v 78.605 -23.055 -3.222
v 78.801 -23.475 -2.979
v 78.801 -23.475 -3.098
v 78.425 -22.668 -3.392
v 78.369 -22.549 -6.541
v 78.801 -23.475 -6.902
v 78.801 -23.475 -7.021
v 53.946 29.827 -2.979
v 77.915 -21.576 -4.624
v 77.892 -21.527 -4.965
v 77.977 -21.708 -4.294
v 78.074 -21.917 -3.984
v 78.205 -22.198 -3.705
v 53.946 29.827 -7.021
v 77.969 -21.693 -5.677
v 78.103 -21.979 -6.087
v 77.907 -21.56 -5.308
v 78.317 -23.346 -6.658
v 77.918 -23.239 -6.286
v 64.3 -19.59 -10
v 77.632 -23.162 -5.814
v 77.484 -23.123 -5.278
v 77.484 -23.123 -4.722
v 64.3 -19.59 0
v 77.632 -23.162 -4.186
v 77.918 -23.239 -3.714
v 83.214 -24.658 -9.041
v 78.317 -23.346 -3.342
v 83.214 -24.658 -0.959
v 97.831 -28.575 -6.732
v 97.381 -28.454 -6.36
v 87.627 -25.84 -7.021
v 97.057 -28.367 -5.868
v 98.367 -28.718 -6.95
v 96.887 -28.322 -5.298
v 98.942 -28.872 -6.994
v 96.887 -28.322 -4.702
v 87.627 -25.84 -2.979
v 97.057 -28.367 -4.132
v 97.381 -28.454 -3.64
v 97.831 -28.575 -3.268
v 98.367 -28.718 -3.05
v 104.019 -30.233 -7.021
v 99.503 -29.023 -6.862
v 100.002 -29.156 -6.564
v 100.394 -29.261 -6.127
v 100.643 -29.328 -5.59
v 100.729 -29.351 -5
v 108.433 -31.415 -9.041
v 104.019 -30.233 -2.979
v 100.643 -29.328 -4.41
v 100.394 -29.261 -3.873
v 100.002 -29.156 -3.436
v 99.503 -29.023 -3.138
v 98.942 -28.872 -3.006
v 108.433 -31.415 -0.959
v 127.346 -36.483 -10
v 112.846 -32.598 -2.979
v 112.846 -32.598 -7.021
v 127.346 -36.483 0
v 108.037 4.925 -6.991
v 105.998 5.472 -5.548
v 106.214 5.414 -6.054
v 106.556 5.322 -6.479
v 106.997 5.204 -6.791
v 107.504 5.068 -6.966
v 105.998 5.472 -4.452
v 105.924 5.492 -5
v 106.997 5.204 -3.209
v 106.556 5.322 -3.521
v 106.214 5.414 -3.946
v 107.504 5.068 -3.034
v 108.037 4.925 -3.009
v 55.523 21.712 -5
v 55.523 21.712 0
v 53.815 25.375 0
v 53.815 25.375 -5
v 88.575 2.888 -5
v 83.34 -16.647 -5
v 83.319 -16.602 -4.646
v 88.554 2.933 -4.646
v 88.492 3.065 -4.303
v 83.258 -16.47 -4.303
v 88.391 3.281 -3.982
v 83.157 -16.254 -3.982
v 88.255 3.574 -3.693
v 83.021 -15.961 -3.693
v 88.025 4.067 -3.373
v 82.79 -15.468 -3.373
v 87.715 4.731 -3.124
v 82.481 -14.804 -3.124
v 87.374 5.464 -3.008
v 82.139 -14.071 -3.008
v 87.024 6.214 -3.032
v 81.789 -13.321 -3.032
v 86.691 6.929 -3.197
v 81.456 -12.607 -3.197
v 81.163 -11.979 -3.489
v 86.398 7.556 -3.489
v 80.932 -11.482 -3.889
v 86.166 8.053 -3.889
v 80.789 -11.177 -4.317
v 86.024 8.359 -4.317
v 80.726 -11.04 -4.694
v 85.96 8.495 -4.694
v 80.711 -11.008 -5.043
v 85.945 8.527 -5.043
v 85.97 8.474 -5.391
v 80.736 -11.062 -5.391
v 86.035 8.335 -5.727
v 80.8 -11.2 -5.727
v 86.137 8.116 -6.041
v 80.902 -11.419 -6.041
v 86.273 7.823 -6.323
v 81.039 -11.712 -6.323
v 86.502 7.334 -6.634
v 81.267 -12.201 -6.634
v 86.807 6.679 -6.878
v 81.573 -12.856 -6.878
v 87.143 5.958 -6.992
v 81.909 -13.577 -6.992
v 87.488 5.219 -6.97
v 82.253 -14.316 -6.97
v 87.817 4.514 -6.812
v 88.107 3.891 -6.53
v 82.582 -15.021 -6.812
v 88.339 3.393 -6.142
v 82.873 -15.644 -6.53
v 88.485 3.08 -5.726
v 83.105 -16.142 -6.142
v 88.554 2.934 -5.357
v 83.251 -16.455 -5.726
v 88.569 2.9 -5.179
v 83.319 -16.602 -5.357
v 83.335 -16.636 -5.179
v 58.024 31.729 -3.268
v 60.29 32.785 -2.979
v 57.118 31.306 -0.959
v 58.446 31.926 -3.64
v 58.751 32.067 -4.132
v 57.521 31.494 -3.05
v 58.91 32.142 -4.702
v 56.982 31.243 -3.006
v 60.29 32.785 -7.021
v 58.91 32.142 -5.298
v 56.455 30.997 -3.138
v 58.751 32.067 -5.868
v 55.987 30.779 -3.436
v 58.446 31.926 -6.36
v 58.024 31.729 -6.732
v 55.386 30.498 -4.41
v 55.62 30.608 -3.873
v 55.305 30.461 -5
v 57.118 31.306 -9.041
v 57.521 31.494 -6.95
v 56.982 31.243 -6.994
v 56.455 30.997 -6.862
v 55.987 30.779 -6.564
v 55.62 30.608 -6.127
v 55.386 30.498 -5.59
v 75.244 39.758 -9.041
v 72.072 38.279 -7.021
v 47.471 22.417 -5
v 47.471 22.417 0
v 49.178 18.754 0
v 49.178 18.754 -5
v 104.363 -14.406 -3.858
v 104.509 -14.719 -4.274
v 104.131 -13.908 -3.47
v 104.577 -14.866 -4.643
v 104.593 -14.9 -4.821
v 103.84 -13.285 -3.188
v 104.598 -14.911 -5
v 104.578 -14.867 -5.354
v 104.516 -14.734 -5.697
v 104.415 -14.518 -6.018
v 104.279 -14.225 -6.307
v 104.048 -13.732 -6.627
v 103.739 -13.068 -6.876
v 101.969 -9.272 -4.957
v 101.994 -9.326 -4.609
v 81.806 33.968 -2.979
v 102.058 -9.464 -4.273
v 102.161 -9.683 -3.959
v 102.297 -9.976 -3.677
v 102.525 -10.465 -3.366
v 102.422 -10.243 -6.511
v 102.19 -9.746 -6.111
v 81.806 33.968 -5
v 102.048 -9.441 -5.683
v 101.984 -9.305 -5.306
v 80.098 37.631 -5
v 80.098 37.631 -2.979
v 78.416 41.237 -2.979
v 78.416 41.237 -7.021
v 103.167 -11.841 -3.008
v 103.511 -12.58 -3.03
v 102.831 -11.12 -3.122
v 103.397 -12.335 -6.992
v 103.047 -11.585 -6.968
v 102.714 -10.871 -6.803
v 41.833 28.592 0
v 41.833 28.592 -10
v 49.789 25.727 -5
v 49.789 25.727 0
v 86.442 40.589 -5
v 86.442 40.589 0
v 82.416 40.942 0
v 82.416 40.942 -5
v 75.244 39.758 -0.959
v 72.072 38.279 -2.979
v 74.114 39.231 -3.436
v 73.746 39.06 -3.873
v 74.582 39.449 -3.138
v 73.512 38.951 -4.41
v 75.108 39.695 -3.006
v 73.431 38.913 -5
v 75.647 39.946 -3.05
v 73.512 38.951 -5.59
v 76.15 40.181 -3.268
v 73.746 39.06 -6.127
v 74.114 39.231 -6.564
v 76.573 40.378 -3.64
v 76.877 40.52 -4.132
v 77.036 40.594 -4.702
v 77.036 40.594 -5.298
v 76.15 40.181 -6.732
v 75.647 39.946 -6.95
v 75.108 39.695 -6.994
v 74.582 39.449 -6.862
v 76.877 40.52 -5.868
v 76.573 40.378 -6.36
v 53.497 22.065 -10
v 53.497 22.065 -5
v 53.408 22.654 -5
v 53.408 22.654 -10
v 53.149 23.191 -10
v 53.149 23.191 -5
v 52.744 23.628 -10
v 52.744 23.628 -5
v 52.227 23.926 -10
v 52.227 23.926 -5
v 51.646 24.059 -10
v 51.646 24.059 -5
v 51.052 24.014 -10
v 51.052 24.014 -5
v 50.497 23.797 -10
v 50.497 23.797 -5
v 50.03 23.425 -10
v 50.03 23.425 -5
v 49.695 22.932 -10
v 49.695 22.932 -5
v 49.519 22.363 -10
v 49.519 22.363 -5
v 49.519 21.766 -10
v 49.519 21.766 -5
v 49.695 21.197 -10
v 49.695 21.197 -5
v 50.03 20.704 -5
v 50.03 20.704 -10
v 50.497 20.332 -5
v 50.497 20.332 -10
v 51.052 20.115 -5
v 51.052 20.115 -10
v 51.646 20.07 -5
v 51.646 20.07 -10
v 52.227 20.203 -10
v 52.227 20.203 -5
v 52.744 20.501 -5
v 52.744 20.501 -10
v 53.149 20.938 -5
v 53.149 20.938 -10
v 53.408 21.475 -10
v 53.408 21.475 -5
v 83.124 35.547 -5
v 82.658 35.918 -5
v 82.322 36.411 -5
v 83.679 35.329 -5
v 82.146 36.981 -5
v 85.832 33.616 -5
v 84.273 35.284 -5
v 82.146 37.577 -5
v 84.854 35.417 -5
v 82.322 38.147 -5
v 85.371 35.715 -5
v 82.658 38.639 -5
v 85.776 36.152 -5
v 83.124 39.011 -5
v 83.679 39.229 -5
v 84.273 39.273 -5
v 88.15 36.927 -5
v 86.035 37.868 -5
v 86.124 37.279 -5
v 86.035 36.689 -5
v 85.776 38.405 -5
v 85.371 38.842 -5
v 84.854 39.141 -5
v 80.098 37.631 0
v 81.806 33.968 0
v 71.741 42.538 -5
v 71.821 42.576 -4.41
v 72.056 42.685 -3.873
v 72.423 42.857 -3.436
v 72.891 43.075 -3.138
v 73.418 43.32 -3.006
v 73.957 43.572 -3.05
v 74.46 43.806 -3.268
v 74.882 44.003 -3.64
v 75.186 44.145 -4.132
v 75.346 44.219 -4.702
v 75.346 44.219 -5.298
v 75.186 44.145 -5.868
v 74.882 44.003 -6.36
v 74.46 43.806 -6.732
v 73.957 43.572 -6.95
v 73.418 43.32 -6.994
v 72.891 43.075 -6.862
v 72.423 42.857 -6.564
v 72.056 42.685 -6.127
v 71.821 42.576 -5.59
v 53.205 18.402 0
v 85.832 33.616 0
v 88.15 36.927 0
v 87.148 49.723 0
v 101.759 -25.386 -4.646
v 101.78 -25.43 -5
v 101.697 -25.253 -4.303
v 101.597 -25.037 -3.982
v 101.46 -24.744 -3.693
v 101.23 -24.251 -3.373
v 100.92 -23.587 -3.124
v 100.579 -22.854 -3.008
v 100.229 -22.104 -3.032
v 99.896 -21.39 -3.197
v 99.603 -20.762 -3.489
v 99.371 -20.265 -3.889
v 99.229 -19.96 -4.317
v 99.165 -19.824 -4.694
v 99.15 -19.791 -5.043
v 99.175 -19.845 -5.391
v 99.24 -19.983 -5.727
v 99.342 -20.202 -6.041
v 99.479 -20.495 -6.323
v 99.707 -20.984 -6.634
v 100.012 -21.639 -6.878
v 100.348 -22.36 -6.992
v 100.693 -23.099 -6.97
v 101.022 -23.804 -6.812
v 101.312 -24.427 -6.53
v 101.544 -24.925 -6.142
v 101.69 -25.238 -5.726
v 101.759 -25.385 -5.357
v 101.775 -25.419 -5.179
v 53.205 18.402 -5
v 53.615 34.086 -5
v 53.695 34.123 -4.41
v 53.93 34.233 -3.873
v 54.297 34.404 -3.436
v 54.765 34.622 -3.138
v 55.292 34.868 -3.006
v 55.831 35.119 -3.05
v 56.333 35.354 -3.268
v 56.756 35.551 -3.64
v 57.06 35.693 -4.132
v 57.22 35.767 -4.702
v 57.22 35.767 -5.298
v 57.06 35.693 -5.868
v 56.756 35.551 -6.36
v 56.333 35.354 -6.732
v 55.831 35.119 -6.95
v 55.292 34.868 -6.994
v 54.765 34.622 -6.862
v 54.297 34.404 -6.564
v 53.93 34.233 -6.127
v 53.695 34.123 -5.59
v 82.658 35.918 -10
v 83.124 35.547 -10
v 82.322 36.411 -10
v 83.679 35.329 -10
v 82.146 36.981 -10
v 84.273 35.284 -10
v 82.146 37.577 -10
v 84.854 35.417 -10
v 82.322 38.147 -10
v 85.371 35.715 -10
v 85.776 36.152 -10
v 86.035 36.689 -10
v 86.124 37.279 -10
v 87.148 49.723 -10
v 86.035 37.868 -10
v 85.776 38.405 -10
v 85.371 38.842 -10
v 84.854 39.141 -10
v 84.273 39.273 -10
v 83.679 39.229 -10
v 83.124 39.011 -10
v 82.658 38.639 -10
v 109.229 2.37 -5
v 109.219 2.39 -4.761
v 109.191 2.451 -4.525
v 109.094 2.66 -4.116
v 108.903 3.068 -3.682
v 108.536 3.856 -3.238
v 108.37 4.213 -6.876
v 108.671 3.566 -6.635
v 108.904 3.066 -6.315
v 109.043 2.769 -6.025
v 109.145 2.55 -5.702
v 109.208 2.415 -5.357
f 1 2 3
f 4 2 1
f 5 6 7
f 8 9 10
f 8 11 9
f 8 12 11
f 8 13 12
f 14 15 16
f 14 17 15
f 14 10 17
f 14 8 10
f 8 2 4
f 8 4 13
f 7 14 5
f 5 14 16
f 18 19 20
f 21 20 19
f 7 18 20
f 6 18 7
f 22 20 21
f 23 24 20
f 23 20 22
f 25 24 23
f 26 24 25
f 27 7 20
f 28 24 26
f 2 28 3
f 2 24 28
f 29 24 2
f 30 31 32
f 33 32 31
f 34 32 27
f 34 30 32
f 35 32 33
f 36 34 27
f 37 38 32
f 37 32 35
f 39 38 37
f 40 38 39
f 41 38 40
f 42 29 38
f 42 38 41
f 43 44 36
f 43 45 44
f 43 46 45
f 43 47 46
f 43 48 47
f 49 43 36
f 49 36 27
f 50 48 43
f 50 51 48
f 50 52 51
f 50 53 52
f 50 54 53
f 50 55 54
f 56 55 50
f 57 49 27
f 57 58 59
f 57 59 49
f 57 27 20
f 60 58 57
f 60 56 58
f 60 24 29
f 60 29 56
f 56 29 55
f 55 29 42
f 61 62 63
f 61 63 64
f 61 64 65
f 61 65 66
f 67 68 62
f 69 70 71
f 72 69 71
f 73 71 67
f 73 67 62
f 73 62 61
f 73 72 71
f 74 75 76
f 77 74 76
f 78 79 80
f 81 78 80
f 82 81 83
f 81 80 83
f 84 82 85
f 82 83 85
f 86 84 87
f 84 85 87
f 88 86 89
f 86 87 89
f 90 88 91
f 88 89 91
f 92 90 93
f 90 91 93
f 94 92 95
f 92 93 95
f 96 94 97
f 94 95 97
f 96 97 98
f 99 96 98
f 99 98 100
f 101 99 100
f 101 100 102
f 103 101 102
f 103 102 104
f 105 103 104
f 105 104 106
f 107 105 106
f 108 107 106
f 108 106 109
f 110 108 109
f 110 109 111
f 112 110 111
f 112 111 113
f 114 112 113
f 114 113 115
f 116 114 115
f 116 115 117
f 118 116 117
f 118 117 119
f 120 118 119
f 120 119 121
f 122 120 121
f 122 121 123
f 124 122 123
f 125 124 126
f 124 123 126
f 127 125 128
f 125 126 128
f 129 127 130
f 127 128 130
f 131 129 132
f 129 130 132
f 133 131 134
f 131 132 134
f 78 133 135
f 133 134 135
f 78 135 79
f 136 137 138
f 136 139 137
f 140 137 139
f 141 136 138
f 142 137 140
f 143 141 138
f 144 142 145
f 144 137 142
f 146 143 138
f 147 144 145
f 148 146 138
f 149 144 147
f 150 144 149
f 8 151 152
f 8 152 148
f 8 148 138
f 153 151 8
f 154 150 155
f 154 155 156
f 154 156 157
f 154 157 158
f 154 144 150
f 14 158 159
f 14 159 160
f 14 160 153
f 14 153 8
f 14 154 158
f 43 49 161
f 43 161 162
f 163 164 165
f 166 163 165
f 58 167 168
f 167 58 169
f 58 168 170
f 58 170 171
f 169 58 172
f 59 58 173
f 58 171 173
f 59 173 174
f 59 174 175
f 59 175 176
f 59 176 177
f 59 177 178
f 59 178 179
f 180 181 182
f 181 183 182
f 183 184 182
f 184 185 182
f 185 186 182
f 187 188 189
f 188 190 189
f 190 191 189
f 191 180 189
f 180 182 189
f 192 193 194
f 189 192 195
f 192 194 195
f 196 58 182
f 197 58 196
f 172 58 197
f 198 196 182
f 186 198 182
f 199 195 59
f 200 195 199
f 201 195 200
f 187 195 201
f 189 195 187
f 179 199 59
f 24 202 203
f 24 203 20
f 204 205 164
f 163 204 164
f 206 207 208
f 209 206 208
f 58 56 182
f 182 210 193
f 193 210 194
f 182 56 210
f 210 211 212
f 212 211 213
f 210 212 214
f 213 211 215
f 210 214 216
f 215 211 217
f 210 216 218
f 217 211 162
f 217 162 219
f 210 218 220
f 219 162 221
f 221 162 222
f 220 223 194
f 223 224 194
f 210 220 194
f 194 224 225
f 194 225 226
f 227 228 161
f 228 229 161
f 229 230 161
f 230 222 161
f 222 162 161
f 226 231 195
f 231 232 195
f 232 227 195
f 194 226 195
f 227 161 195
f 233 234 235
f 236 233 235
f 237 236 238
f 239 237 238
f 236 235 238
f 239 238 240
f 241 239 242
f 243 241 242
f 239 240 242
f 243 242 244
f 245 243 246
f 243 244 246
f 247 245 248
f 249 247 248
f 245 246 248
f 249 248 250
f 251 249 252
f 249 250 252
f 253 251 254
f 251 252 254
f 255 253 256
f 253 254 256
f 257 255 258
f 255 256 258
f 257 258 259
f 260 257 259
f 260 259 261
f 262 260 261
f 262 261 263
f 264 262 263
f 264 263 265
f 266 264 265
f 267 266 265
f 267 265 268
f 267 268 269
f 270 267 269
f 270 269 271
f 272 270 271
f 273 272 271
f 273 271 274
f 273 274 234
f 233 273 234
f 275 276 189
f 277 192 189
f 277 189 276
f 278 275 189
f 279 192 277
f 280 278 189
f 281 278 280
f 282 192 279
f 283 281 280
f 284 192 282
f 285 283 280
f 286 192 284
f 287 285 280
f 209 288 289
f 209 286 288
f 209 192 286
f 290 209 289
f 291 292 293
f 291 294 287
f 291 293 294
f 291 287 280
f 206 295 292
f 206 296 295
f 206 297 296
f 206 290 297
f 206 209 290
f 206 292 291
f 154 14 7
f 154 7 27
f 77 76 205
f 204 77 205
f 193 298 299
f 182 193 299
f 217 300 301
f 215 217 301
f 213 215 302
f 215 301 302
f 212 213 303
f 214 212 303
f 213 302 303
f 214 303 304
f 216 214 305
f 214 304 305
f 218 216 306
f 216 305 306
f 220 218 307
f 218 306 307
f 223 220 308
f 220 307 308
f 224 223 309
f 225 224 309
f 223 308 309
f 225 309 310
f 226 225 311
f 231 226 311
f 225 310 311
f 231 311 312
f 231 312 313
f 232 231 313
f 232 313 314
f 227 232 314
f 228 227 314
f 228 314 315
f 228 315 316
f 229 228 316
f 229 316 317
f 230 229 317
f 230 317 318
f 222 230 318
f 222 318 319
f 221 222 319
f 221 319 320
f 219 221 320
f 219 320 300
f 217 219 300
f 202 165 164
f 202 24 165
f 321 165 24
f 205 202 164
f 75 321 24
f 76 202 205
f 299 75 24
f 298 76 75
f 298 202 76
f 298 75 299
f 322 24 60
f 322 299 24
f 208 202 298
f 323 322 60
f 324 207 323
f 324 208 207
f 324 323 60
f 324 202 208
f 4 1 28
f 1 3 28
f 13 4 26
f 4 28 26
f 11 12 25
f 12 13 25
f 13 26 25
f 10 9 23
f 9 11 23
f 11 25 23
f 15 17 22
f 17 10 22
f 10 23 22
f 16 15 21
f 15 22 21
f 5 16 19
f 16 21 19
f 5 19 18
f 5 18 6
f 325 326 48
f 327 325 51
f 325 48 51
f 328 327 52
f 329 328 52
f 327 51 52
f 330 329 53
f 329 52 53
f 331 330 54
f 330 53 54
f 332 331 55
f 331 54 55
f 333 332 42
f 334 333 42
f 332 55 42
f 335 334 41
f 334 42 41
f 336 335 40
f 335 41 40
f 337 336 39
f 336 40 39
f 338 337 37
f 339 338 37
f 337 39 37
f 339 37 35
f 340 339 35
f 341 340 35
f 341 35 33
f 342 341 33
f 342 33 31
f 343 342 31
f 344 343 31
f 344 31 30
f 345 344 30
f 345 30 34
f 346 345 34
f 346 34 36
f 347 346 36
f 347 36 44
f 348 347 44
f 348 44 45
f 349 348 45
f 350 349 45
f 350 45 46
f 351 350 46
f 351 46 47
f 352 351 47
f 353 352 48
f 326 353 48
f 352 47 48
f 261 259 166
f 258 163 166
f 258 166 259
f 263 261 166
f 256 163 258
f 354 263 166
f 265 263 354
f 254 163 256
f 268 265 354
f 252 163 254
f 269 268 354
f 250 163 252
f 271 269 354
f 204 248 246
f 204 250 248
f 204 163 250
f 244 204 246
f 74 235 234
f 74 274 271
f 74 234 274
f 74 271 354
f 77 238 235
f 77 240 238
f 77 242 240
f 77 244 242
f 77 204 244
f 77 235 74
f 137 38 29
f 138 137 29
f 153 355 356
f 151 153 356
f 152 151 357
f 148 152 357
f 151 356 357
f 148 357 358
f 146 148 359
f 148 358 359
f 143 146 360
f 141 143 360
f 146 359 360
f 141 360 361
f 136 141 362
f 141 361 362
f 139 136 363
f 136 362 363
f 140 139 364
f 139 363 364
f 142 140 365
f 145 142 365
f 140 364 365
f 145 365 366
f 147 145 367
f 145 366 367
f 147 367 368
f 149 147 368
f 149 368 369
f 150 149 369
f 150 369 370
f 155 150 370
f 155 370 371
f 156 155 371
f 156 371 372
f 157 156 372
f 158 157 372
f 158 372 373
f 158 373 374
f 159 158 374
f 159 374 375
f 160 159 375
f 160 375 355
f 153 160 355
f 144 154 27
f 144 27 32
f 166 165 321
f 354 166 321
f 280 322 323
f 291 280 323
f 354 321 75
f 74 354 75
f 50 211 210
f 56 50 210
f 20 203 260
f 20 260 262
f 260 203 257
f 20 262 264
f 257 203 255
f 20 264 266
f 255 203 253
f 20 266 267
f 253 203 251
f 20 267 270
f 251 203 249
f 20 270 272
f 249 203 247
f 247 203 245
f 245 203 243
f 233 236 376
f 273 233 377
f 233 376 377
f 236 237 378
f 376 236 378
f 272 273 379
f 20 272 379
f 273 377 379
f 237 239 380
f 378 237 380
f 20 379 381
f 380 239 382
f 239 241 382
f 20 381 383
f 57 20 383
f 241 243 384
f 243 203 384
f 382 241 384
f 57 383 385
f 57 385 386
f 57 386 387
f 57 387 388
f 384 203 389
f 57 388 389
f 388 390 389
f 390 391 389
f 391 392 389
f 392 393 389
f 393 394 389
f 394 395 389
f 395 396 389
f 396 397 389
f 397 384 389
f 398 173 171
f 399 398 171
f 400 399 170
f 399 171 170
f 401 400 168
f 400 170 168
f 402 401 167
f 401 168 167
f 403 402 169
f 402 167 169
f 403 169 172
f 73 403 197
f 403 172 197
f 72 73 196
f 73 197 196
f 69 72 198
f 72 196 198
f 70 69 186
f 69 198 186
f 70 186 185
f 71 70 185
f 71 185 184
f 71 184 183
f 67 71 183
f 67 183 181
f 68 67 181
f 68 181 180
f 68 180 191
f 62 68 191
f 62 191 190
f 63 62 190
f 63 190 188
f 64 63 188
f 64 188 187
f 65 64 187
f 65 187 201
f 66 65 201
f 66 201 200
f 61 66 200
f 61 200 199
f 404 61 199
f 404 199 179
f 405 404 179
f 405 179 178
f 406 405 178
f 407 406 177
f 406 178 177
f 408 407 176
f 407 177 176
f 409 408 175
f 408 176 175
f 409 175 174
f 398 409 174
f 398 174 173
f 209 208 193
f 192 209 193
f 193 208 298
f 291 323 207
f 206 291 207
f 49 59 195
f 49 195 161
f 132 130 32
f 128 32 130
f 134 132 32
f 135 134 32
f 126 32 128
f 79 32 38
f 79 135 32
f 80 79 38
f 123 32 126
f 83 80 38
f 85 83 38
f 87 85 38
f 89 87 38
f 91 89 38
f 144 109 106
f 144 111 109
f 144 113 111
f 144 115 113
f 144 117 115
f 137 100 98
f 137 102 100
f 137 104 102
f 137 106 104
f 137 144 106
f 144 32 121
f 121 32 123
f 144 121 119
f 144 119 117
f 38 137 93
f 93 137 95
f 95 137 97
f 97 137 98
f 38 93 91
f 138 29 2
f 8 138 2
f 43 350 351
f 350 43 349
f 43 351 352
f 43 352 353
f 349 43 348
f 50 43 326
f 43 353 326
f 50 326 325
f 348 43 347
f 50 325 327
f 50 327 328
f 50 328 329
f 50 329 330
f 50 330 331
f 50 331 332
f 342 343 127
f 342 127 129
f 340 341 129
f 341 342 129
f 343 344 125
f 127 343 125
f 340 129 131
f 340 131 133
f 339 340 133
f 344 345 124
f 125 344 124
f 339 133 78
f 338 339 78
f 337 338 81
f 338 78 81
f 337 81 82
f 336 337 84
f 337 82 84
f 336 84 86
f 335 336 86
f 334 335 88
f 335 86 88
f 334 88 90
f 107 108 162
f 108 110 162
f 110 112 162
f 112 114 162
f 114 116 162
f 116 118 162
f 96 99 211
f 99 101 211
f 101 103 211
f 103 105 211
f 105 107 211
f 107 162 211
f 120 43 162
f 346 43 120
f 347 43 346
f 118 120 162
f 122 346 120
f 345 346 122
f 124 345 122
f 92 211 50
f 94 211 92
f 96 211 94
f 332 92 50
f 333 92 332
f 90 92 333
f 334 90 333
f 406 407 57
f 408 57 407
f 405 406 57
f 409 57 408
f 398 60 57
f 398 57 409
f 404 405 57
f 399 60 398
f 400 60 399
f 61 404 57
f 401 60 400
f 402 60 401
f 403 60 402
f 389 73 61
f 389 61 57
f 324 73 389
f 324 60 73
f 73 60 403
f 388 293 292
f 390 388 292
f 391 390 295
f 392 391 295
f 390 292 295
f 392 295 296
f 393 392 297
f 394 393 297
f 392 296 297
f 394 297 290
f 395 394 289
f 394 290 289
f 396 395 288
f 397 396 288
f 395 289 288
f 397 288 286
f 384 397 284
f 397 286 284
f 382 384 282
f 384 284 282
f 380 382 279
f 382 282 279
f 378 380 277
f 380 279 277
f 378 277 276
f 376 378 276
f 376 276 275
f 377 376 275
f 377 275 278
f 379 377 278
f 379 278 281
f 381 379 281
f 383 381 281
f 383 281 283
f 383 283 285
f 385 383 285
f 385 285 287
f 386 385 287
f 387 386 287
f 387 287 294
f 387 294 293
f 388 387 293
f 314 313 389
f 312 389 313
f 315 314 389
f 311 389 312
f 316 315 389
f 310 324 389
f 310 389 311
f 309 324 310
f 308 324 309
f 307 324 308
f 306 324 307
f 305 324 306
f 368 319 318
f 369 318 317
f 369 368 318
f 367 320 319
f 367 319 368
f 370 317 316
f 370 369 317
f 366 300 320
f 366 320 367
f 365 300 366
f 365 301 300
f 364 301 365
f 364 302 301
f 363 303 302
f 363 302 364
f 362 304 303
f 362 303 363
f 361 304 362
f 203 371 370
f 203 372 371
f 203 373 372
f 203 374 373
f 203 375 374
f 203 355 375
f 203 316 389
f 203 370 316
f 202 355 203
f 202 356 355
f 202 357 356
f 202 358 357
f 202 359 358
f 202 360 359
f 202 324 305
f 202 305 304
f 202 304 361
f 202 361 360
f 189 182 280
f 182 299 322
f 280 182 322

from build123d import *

# Parameters (mm, degrees)
BOSS_EXTRUDE1_DEPTH = 10
SKETCH2_R           = 2
CUT_EXTRUDE1_DEPTH  = 139.371645796
CUT_EXTRUDE2_START  = -4
SKETCH2_3_R         = 2
CUT_EXTRUDE2_DEPTH  = 135.371645796
SKETCH3_R           = 2
CUT_EXTRUDE3_DEPTH  = 35
SKETCH4_R           = 2
CUT_EXTRUDE4_DEPTH  = 10
SKETCH4_3_R         = 2
CUT_EXTRUDE5_DEPTH  = 5


with BuildPart() as part:
    # Sketch1 → Boss-Extrude1 (new body)
    with BuildSketch(Plane.XY):
        Polygon((127.346442995, -36.483176399), (87.147938799, 49.722794044), (41.832549447, 28.591880957), (64.300112266, -19.589962995), align=None)
    extrude(amount=-BOSS_EXTRUDE1_DEPTH)

    # Sketch2 → Cut-Extrude1 (cut, through all)
    with BuildSketch(Plane(origin=(-3.479773272, 7.462397864, 0), x_dir=(0.9063077870366519, 0.4226182617406953, 0), z_dir=(-0.42261826174069533, 0.906307787036652, 0))):
        with Locations(Location((64.996616346, 5, 0), (0, 0, 180))):
            Circle(SKETCH2_R)
        with Locations(Location((84.996616346, 5, 0), (0, 0, 180))):
            Circle(SKETCH2_R)
    extrude(amount=-CUT_EXTRUDE1_DEPTH, mode=Mode.SUBTRACT)

    # Sketch2<3> → Cut-Extrude2 (cut, through all)
    # profile 1 of 2: a face of its own
    with BuildSketch(Plane(origin=(-3.479773272, 7.462397864, 0), x_dir=(0.9063077870366519, 0.4226182617406953, 0), z_dir=(-0.42261826174069533, 0.906307787036652, 0)).offset(CUT_EXTRUDE2_START)):
        Polygon((84.996616346, 0.958548116), (88.496616346, 2.979274058), (88.496616346, 7.020725942), (84.996616346, 9.041451884), (81.496616346, 7.020725942), (81.496616346, 2.979274058), align=None)
        with Locations(Location((84.996616346, 5, 0), (0, 0, 180))):
            Circle(SKETCH2_3_R, mode=Mode.SUBTRACT)
    # profile 2 of 2: a face of its own
    with BuildSketch(Plane(origin=(-3.479773272, 7.462397864, 0), x_dir=(0.9063077870366519, 0.4226182617406953, 0), z_dir=(-0.42261826174069533, 0.906307787036652, 0)).offset(CUT_EXTRUDE2_START)):
        Polygon((68.496616346, 2.979274058), (64.996616346, 0.958548116), (61.496616346, 2.979274058), (61.496616346, 7.020725942), (64.996616346, 9.041451884), (68.496616346, 7.020725942), align=None)
        with Locations(Location((64.996616346, 5, 0), (0, 0, 180))):
            Circle(SKETCH2_3_R, mode=Mode.SUBTRACT)
    extrude(amount=-CUT_EXTRUDE2_DEPTH, mode=Mode.SUBTRACT)

    # Sketch3 → Cut-Extrude3 (cut)
    with BuildSketch(Plane(origin=(-0.59019996, -2.202656237, 0), x_dir=(0.9659258262890685, -0.2588190451025201, 0), z_dir=(-0.2588190451025201, -0.9659258262890685, 0))):
        with Locations((82.809116935, -5)):
            Circle(SKETCH3_R)
        with Locations((102.893564909, -5)):
            Circle(SKETCH3_R)
    extrude(amount=-CUT_EXTRUDE3_DEPTH, mode=Mode.SUBTRACT)

    # Sketch4 → Cut-Extrude4 (cut)
    with BuildSketch(Plane.XY):
        with Locations((84.12365912, 37.27877008)):
            Circle(SKETCH4_R)
        with Locations((51.496578787, 22.064512657)):
            Circle(SKETCH4_R)
    extrude(amount=-CUT_EXTRUDE4_DEPTH, mode=Mode.SUBTRACT)

    # Sketch4<3> → Cut-Extrude5 (cut)
    # profile 1 of 2: a face of its own
    with BuildSketch(Plane.XY):
        Polygon((88.14973206, 36.926534339), (86.44174069, 40.589333653), (82.41566775, 40.941569394), (80.09758618, 37.631005821), (81.805577551, 33.968206507), (85.83165049, 33.615970766), align=None)
        with Locations((84.12365912, 37.27877008)):
            Circle(SKETCH4_3_R, mode=Mode.SUBTRACT)
    # profile 2 of 2: a face of its own
    with BuildSketch(Plane.XY):
        Polygon((55.522651726, 21.712276917), (53.814660356, 25.37507623), (49.788587416, 25.727311971), (47.470505847, 22.416748398), (49.178497217, 18.753949084), (53.204570157, 18.401713344), align=None)
        with Locations((51.496578787, 22.064512657)):
            Circle(SKETCH4_3_R, mode=Mode.SUBTRACT)
    extrude(amount=-CUT_EXTRUDE5_DEPTH, mode=Mode.SUBTRACT)


solid = part.part
